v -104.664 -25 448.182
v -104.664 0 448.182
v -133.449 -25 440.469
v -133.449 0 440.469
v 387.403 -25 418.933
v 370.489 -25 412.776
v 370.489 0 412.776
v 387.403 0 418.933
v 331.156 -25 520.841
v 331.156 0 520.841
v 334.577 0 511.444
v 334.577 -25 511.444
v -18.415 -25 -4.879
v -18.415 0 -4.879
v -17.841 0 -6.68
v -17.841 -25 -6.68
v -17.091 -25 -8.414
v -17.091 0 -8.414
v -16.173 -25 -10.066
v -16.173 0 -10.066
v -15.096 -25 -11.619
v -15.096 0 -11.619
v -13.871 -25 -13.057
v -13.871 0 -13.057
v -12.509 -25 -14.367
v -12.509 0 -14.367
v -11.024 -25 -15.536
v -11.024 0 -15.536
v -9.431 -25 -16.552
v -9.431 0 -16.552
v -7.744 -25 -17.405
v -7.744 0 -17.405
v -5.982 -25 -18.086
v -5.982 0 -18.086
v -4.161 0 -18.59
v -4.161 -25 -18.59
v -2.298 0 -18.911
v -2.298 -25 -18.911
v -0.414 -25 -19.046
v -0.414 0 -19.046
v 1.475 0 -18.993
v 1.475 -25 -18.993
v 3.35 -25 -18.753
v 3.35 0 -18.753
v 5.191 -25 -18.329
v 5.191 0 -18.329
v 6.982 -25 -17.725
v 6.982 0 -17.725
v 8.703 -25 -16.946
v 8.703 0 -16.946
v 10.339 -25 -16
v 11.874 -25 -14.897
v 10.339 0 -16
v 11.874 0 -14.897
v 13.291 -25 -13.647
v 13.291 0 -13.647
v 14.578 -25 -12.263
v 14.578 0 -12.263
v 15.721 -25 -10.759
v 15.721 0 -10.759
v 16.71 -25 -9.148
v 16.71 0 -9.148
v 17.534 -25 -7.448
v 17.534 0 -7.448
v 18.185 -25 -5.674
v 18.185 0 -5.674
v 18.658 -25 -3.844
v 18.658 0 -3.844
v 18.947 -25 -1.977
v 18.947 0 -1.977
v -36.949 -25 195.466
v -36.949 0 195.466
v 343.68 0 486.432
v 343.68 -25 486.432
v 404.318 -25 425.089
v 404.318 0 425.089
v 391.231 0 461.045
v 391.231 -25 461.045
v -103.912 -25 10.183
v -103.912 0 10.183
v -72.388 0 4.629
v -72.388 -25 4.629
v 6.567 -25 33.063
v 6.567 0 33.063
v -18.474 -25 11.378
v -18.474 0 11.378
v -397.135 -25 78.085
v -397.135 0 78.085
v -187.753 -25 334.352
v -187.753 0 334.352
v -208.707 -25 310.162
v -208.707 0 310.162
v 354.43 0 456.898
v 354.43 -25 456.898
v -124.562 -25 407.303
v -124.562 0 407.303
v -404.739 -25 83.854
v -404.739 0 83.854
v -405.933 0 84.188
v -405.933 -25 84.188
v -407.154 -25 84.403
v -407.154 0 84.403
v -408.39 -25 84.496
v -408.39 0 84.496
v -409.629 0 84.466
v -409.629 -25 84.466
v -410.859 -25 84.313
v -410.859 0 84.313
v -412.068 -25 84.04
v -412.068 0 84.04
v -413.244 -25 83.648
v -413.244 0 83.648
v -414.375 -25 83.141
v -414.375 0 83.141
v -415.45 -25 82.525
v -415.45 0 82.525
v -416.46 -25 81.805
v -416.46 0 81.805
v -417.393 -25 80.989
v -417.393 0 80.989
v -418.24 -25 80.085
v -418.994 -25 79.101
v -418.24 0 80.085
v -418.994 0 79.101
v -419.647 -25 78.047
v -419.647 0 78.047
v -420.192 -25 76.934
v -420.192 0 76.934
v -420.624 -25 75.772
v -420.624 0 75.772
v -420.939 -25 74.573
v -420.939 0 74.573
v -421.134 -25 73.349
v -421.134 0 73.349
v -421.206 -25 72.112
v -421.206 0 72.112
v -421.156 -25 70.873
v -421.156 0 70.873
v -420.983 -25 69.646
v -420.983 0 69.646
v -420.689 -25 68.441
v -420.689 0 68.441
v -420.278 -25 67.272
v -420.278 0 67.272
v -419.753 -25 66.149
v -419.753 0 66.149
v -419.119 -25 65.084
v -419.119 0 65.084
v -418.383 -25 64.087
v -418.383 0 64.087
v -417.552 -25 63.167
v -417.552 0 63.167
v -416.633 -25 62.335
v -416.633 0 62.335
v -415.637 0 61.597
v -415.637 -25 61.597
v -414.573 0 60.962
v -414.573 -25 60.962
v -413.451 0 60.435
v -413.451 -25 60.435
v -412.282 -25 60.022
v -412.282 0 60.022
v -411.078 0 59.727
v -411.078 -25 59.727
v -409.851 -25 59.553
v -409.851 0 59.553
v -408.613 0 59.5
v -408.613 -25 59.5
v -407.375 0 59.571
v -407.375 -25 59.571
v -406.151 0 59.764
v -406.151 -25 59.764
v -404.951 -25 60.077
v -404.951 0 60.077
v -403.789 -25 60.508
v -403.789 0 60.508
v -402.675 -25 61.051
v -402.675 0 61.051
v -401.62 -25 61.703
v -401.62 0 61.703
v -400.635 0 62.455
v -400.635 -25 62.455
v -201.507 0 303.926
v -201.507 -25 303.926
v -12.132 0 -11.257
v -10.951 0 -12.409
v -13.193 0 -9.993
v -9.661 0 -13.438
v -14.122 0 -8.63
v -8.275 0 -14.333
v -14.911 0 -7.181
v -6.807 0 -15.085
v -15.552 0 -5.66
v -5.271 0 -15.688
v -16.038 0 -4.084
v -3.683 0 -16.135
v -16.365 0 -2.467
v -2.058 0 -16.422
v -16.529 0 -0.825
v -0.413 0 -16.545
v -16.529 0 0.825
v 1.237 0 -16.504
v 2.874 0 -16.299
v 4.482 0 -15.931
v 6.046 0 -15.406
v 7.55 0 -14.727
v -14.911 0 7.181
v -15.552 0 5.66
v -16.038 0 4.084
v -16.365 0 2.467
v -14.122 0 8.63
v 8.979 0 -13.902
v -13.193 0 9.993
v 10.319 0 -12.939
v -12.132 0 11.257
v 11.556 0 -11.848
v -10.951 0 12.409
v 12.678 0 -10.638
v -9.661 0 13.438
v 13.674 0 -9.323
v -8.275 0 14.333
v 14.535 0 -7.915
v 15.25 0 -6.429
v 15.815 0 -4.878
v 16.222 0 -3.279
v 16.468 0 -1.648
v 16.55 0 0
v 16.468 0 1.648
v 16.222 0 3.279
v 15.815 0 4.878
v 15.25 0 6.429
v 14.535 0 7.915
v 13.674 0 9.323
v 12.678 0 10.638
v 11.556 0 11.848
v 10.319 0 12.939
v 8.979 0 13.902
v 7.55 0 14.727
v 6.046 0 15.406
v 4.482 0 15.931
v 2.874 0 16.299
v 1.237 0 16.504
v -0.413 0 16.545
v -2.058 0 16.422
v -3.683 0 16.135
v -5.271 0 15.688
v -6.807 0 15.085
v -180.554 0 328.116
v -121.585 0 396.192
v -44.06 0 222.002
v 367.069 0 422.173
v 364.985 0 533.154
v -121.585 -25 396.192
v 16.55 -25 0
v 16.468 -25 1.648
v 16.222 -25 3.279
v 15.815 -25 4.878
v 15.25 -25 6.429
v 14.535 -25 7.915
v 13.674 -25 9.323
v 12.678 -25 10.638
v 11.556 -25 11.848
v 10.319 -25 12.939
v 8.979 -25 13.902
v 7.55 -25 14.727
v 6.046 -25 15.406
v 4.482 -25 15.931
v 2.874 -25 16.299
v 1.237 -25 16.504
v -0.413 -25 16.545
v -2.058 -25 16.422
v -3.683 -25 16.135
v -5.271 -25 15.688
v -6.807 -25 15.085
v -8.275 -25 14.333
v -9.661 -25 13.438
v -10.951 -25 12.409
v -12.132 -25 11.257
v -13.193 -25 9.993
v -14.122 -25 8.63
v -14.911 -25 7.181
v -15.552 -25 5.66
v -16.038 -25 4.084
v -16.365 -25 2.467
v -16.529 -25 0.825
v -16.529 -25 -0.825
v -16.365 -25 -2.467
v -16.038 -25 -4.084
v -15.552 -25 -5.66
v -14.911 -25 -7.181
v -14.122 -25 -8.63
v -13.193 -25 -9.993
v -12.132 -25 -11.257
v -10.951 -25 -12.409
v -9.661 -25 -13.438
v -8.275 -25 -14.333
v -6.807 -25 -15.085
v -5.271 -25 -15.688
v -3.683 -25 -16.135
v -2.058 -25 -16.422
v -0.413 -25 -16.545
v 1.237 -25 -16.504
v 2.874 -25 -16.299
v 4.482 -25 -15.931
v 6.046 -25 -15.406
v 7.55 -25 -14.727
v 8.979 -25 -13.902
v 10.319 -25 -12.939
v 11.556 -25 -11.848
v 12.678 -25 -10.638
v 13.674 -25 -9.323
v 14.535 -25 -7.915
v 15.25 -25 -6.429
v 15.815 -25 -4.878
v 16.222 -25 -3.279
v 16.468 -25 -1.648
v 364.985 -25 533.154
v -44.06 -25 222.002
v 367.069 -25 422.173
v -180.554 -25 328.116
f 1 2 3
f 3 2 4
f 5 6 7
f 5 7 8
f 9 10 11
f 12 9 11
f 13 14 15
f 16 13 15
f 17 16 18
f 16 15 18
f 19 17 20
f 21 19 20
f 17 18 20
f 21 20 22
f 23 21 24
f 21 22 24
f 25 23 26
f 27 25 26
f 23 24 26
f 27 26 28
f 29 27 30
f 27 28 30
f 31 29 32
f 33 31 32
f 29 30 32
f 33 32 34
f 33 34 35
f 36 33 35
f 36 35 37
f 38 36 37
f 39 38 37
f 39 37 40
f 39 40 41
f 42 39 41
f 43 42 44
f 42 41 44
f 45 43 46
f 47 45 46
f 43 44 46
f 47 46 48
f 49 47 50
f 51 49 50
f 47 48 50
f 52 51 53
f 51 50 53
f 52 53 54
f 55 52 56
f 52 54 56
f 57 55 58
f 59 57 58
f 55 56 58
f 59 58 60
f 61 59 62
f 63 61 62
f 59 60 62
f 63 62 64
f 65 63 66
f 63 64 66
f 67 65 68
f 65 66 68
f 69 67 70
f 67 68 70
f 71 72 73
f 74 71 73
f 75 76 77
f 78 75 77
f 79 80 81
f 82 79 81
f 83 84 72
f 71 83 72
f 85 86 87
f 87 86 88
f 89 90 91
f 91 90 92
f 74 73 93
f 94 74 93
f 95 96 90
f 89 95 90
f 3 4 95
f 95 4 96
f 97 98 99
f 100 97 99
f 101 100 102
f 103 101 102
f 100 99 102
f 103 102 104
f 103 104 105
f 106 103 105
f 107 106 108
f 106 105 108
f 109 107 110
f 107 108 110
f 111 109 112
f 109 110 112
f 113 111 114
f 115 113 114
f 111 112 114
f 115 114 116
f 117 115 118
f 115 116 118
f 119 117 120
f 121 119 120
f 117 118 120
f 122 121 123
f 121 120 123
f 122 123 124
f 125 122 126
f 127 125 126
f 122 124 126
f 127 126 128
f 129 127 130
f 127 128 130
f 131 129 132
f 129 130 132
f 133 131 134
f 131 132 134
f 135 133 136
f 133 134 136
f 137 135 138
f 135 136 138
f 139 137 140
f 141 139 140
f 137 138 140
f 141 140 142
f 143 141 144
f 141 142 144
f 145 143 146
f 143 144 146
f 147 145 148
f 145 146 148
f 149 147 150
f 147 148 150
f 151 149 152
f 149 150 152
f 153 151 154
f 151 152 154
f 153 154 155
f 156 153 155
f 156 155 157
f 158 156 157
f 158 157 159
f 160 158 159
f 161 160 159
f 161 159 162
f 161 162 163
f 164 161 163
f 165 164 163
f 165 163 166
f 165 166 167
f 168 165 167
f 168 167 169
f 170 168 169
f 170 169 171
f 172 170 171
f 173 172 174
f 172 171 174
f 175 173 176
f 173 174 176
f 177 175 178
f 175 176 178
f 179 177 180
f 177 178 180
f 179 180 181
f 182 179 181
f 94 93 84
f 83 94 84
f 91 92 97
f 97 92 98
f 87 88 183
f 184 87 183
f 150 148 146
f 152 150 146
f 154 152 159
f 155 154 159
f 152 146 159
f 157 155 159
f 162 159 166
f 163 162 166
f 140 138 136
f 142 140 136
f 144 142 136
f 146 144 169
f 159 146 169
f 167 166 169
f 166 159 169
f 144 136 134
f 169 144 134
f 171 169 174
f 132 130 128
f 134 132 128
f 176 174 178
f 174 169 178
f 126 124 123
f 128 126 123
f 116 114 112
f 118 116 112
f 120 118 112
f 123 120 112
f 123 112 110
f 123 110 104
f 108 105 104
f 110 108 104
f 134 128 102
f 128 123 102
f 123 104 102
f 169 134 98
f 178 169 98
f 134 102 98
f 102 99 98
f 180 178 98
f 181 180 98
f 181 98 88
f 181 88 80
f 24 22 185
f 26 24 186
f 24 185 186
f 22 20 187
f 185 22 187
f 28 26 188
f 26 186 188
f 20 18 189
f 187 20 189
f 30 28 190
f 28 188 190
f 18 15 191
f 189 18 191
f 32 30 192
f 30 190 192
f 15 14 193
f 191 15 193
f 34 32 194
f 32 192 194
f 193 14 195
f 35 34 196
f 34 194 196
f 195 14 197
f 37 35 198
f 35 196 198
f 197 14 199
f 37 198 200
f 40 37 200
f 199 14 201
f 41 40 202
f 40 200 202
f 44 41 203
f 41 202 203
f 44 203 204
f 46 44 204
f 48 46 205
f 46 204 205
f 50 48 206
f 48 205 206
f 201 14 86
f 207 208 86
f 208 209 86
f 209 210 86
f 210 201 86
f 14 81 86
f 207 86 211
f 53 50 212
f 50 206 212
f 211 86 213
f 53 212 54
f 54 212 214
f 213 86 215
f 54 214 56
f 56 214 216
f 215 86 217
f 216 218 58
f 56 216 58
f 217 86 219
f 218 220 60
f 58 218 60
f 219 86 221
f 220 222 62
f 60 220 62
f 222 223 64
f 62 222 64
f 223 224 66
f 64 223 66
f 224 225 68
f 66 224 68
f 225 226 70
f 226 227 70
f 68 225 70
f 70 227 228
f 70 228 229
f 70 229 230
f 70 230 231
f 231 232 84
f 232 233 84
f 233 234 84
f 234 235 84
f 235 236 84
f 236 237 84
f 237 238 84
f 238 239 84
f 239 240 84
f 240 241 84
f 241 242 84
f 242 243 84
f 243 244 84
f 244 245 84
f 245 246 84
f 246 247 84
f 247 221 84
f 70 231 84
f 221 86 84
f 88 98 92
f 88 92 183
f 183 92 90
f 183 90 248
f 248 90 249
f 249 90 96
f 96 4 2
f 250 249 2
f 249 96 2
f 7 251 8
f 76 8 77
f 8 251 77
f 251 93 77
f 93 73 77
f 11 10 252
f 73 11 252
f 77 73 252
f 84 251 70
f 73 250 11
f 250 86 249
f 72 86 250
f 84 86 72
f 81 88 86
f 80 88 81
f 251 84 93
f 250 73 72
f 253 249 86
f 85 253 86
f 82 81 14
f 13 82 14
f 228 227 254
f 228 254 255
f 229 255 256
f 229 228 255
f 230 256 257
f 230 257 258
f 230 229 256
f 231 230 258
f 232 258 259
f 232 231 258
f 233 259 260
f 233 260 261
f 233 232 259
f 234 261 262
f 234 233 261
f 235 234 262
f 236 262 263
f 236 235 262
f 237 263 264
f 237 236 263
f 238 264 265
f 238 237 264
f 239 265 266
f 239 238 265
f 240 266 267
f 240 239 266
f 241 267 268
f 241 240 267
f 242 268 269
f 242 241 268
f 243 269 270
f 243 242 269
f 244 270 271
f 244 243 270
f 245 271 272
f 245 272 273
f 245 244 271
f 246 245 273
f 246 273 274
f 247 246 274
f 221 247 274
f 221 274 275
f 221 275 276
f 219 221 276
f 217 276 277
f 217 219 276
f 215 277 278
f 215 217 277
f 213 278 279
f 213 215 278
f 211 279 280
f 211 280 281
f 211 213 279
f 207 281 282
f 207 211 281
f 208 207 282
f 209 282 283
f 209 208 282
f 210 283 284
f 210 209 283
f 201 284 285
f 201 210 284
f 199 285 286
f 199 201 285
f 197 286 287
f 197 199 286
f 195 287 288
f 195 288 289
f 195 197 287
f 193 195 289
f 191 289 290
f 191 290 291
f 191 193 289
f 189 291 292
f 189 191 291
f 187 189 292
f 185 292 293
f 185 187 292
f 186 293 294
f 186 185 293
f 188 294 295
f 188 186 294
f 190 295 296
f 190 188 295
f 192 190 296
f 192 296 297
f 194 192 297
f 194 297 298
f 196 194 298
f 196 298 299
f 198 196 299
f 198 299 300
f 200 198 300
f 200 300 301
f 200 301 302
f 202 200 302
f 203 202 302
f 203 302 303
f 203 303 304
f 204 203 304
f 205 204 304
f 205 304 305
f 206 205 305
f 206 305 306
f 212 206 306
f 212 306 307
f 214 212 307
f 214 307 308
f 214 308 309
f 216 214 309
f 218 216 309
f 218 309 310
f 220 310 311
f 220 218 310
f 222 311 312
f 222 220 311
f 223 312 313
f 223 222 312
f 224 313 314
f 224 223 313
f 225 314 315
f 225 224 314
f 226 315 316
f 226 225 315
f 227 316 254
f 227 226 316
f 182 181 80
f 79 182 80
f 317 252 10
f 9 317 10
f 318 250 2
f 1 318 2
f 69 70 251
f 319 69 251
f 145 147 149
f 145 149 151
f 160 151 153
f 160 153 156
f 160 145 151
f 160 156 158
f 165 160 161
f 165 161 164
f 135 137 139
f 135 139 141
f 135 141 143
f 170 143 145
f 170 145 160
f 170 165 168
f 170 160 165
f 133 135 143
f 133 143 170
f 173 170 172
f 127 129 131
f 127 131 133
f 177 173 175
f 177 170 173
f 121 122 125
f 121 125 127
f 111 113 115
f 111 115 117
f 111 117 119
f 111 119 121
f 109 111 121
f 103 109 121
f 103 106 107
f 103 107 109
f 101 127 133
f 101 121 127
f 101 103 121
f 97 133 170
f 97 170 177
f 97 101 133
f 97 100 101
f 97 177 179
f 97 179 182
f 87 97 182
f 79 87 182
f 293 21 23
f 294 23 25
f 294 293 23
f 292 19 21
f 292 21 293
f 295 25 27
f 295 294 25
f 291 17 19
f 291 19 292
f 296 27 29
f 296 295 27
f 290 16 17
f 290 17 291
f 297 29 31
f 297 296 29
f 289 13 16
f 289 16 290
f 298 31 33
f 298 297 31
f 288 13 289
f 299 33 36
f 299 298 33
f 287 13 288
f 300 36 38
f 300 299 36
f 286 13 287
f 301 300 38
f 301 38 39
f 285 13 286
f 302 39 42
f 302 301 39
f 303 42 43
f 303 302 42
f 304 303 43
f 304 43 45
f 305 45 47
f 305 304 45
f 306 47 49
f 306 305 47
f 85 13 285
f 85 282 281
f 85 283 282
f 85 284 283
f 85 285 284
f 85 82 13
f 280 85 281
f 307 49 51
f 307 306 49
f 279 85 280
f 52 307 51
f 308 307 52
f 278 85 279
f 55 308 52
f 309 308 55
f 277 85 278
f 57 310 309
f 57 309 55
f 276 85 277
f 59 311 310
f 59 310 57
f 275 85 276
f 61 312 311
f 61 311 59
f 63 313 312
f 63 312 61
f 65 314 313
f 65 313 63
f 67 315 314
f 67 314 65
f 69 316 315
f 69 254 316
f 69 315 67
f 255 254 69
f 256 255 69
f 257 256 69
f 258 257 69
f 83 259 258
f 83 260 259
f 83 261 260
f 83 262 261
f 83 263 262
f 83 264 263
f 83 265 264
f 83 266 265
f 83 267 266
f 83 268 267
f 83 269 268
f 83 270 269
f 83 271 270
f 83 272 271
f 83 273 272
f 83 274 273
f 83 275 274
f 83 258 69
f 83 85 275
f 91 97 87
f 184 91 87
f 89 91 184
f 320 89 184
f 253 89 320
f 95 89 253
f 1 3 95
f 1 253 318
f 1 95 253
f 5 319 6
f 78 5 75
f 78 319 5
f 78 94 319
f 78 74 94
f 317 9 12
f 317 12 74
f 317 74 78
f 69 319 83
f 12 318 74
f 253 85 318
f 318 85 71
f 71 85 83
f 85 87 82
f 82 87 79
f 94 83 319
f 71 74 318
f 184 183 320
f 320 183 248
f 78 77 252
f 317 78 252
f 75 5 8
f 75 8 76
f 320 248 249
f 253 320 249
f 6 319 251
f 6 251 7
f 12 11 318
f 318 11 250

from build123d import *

# Parameters (mm, degrees)
F1_R     = 16.55
F0_DEPTH = 25


with BuildPart() as f0:
    # F1 (on Front) → F0 (new body)
    with BuildSketch(Plane.XZ):
        with BuildLine():
            ThreePointArc((18.9471511403, -1.9768570177), (19.0242704094, -0.9897653202), (19.05, 0))
            ThreePointArc((19.05, 0), (17.0081092666, 8.5806013294), (11.3201607165, 15.3217643028))
            ThreePointArc((11.3201607165, 15.3217643028), (3.1862146863, 18.7816542395), (-5.6337146577, 18.1979053508))
            ThreePointArc((-5.6337146577, 18.1979053508), (-12.7048225923, 14.1947167248), (-17.4644289069, 7.6089567588))
            ThreePointArc((-17.4644289069, 7.6089567588), (-18.9951016681, 1.4452033137), (-18.4145629505, -4.8791773224))
            ThreePointArc((-18.4145629505, -4.8791773224), (1.4753909085, -18.9927807776), (18.9471511403, -1.9768570177))
        make_face()
        Circle(F1_R, mode=Mode.SUBTRACT)
        with BuildLine():
            ThreePointArc((11.3201607165, 15.3217643028), (17.0081092666, 8.5806013294), (19.05, 0))
            ThreePointArc((19.05, 0), (19.0242704094, -0.9897653202), (18.9471511403, -1.9768570177))
            Line((18.9471511403, -1.9768570177), (367.068516355, 422.1730984288))
            Line((367.068516355, 422.1730984288), (358.5591705204, 445.5523339637))
            Line((358.5591705204, 445.5523339637), (354.4296862364, 456.8979987878))
            Line((354.4296862364, 456.8979987878), (197.6336692676, 265.8582343353))
            Line((197.6336692676, 265.8582343353), (68.718206586, 108.788047853))
            Line((68.718206586, 108.788047853), (6.5665120874, 33.0626225082))
            Line((6.5665120874, 33.0626225082), (11.3201607165, 15.3217643028))
        make_face()
        with BuildLine():
            ThreePointArc((-5.6337146577, 18.1979053508), (3.1862146863, 18.7816542395), (11.3201607165, 15.3217643028))
            Line((11.3201607165, 15.3217643028), (6.5665120874, 33.0626225082))
            Line((6.5665120874, 33.0626225082), (-36.9494436056, 195.4663800944))
            Line((-36.9494436056, 195.4663800944), (-44.0597309982, 222.0023338999))
            Line((-44.0597309982, 222.0023338999), (-104.6644659355, 448.182283865))
            Line((-104.6644659355, 448.182283865), (-133.4490555589, 440.4694763209))
            Line((-133.4490555589, 440.4694763209), (-124.5620482674, 407.302713582))
            Line((-124.5620482674, 407.302713582), (-121.5848978652, 396.1918370193))
            Line((-121.5848978652, 396.1918370193), (-18.4742653371, 11.3777176238))
            Line((-18.4742653371, 11.3777176238), (-17.4644289069, 7.6089567588))
            ThreePointArc((-17.4644289069, 7.6089567588), (-12.7048225923, 14.1947167248), (-5.6337146577, 18.1979053508))
        make_face()
        with BuildLine():
            Line((-72.3879589454, 4.6290750499), (-18.4145629505, -4.8791773224))
            ThreePointArc((-18.4145629505, -4.8791773224), (-18.9951016681, 1.4452033137), (-17.4644289069, 7.6089567588))
            Line((-17.4644289069, 7.6089567588), (-18.4742653371, 11.3777176238))
            Line((-18.4742653371, 11.3777176238), (-69.612055331, 20.3864339378))
            ThreePointArc((-69.612055331, 20.3864339378), (-70.9081149957, 12.4915662651), (-72.3879589454, 4.6290750499))
        make_face()
        Polygon((358.5591705204, 445.5523339637), (367.068516355, 422.1730984288), (370.4887177882, 412.7761722209), (387.4031849624, 418.9325348008), (404.3176521365, 425.0888973806), (391.2308402699, 461.0446174767), (364.9853356541, 533.153548771), (331.1564013058, 520.8408236113), (334.576602739, 511.4438974034), (343.6802788522, 486.4317528486), (354.4296862364, 456.8979987878), align=None)
        Polygon((-44.0597309982, 222.0023338999), (-36.9494436056, 195.4663800944), (128.9154626816, 322.2587492585), (343.6802788522, 486.4317528486), (334.576602739, 511.4438974034), align=None)
        with BuildLine():
            Line((-103.9121348451, 10.1825484742), (-72.3879589454, 4.6290750499))
            ThreePointArc((-72.3879589454, 4.6290750499), (-70.9081149957, 12.4915662651), (-69.612055331, 20.3864339378))
            Line((-69.612055331, 20.3864339378), (-101.1362312306, 25.9399073622))
            ThreePointArc((-101.1362312306, 25.9399073622), (-102.4228327716, 18.043373494), (-103.9121348451, 10.1825484742))
        make_face()
        with BuildLine():
            Line((-124.5620482674, 407.302713582), (-187.7531740158, 334.3521096451))
            ThreePointArc((-187.7531740158, 334.3521096451), (-184.1317567279, 331.2589177075), (-180.5536370153, 328.1157411523))
            Line((-180.5536370153, 328.1157411523), (-121.5848978652, 396.1918370193))
            Line((-121.5848978652, 396.1918370193), (-124.5620482674, 407.302713582))
        make_face()
        with BuildLine():
            ThreePointArc((-180.5536370153, 328.1157411523), (-184.1317567279, 331.2589177075), (-187.7531740158, 334.3521096451))
            Line((-187.7531740158, 334.3521096451), (-208.7069809814, 310.1621169077))
            ThreePointArc((-208.7069809814, 310.1621169077), (-205.0833359165, 307.0714968135), (-201.5074439809, 303.9257484149))
            Line((-201.5074439809, 303.9257484149), (-180.5536370153, 328.1157411523))
        make_face()
        with BuildLine():
            Line((-400.6354173431, 62.4549653328), (-103.9121348451, 10.1825484742))
            ThreePointArc((-103.9121348451, 10.1825484742), (-102.4228327716, 18.043373494), (-101.1362312306, 25.9399073622))
            Line((-101.1362312306, 25.9399073622), (-397.1350282031, 78.084694838))
            Line((-397.1350282031, 78.084694838), (-201.5074439809, 303.9257484149))
            ThreePointArc((-201.5074439809, 303.9257484149), (-205.0833359165, 307.0714968135), (-208.7069809814, 310.1621169077))
            Line((-208.7069809814, 310.1621169077), (-404.7393478146, 83.8537645513))
            ThreePointArc((-404.7393478146, 83.8537645513), (-398.5615625862, 79.3027613179), (-396.2064961559, 72))
            ThreePointArc((-396.2064961559, 72), (-397.3676583592, 66.7387494433), (-400.6354173431, 62.4549653328))
        make_face()
        with BuildLine():
            ThreePointArc((-404.7393478146, 83.8537645513), (-420.9827692162, 69.6456169071), (-400.6354173431, 62.4549653328))
            ThreePointArc((-400.6354173431, 62.4549653328), (-397.3676583592, 66.7387494433), (-396.2064961559, 72))
            ThreePointArc((-396.2064961559, 72), (-398.5615625862, 79.3027613179), (-404.7393478146, 83.8537645513))
        make_face()
    extrude(amount=F0_DEPTH)


solid = f0.part
